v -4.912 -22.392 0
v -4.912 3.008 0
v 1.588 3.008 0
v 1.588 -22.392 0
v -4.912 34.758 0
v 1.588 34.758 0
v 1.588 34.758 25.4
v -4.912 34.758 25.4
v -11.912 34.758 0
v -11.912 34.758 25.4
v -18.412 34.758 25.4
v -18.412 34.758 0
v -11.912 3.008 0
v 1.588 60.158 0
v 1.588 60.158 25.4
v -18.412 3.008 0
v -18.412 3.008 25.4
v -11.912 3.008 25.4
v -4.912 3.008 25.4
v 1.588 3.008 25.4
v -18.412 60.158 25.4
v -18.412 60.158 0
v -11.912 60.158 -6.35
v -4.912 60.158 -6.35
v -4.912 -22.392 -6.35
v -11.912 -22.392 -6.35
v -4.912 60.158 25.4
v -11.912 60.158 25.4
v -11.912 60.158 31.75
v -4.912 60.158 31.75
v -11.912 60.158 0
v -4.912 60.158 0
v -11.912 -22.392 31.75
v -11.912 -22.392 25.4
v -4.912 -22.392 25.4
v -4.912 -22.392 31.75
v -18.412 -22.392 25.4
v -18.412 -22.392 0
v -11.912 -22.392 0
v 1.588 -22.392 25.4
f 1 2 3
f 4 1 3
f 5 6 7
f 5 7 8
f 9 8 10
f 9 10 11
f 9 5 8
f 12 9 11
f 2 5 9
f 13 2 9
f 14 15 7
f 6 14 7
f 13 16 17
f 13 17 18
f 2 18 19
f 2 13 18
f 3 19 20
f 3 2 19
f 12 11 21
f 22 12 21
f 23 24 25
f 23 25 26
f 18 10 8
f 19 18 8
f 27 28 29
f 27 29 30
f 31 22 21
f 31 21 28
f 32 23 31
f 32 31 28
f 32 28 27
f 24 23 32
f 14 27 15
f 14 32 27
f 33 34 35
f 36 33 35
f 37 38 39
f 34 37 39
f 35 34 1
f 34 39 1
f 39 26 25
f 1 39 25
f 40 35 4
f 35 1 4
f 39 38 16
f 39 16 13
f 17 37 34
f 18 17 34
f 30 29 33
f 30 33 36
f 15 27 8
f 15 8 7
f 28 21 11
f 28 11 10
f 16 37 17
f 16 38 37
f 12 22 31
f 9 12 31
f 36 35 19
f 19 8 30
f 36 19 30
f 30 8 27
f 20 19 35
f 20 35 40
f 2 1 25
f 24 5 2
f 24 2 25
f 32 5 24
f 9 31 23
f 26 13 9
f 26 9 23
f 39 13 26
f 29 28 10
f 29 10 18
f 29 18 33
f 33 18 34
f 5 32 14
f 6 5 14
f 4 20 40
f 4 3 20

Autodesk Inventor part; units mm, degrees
ref_plane "YZ Plane" through (0, 0, 0) normal (1, 0, 0) x (0, 1, 0)
ref_plane "XZ Plane" through (0, 0, 0) normal (0, 1, 0) x (-1, 0, 0)
ref_plane "XY Plane" through (0, 0, 0) normal (0, 0, 1) x (1, 0, 0)
sketch "Sketch1" plane through (0, 0, 0) normal (0, 0, 1) x (1, 0, 0)
  line L0 (-18.4125, 60.1579) -> (1.5875, 60.1579)
  line L1 (1.5875, 60.1579) -> (1.5875, 34.7579)
  line L2 (1.5875, 34.7579) -> (-18.4125, 34.7579)
  line L3 (-18.4125, 34.7579) -> (-18.4125, 60.1579)
  line L4 (-18.4125, 3.0079) -> (1.5875, 3.0079)
  line L5 (1.5875, 3.0079) -> (1.5875, -22.3921)
  line L6 (1.5875, -22.3921) -> (-18.4125, -22.3921)
  line L7 (-18.4125, -22.3921) -> (-18.4125, 3.0079)
  point P0 (0, 0)
  dimension "d0" = 25.4
  dimension "d1" = 25.4
  dimension "d2" = 20
  dimension "d5" = 31.75
extrude "Extrusion1" add sketch "Sketch1" along normal blind 25.4
sketch "Sketch2" plane through (0, 0, 25.4) normal (0, 0, 1) x (1, 0, 0)
  line L0 (1.5875, 60.1579) -> (-18.4125, 60.1579) projected
  line L1 (-18.4125, -22.3921) -> (1.5875, -22.3921) projected
  line L2 (1.5875, 60.1579) -> (-11.9125, 60.1579)
  line L3 (-11.9125, 60.1579) -> (-11.9125, -22.3921)
  line L4 (-11.9125, -22.3921) -> (-4.9125, -22.3921)
  line L5 (-4.9125, -22.3921) -> (-4.9125, 60.1579)
  line L6 (-18.4125, 34.7579) -> (1.5875, 34.7579) projected
  line L7 (1.5875, 34.7579) -> (1.5875, 60.1579) projected
  line L8 (1.5875, 60.1579) -> (-18.4125, 60.1579) projected
  line L9 (-18.4125, 60.1579) -> (-18.4125, 34.7579) projected
  line L10 (-18.4125, -22.3921) -> (1.5875, -22.3921) projected
  line L11 (1.5875, -22.3921) -> (1.5875, 3.0079) projected
  line L12 (1.5875, 3.0079) -> (-18.4125, 3.0079) projected
  line L13 (-18.4125, 3.0079) -> (-18.4125, -22.3921) projected
  point P0 (0, 0)
  point P1 (-11.9125, 34.7579)
  point P2 (-11.9125, 3.0079)
  point P3 (-9.9654, 60.1579)
  dimension "d14" = 20
  dimension "d15" = 7
  dimension "d16" = 6.5
extrude "Extrusion2" add sketch "Sketch2" along normal blind 6.35 contours L5 L6 L3 L0 | L5 L12 L3 L6 | L5 L1 L3 L12
sketch "Sketch3" plane through (0, 0, 0) normal (0, 0, -1) x (-1, 0, 0)
  line L0 (4.9125, 3.0079) -> (11.9125, 3.0079) projected
  line L1 (11.9125, 34.7579) -> (11.9125, 3.0079) projected
  line L2 (11.9125, 34.7579) -> (4.9125, 34.7579) projected
  line L3 (4.9125, 3.0079) -> (4.9125, 34.7579) projected
  line L4 (11.9125, 34.7579) -> (11.9125, 60.1579) projected
  line L5 (4.9125, 60.1579) -> (4.9125, 34.7579) projected
  line L6 (11.9125, -22.3921) -> (11.9125, 3.0079) projected
  line L7 (4.9125, 3.0079) -> (4.9125, -22.3921) projected
  line L8 (11.9125, 60.1579) -> (4.9125, 60.1579)
  line L9 (-1.5875, 60.1579) -> (18.4125, 60.1579) projected
  line L10 (11.9125, -22.3921) -> (4.9125, -22.3921)
  line L11 (18.4125, -22.3921) -> (-1.5875, -22.3921) projected
  point P0 (0, 0)
extrude "Extrusion3" add sketch "Sketch3" along normal blind 6.35
equation "\"d16\" = -0.5 * d15 + 0.5 * d14"
properties part number "spacer_4"
